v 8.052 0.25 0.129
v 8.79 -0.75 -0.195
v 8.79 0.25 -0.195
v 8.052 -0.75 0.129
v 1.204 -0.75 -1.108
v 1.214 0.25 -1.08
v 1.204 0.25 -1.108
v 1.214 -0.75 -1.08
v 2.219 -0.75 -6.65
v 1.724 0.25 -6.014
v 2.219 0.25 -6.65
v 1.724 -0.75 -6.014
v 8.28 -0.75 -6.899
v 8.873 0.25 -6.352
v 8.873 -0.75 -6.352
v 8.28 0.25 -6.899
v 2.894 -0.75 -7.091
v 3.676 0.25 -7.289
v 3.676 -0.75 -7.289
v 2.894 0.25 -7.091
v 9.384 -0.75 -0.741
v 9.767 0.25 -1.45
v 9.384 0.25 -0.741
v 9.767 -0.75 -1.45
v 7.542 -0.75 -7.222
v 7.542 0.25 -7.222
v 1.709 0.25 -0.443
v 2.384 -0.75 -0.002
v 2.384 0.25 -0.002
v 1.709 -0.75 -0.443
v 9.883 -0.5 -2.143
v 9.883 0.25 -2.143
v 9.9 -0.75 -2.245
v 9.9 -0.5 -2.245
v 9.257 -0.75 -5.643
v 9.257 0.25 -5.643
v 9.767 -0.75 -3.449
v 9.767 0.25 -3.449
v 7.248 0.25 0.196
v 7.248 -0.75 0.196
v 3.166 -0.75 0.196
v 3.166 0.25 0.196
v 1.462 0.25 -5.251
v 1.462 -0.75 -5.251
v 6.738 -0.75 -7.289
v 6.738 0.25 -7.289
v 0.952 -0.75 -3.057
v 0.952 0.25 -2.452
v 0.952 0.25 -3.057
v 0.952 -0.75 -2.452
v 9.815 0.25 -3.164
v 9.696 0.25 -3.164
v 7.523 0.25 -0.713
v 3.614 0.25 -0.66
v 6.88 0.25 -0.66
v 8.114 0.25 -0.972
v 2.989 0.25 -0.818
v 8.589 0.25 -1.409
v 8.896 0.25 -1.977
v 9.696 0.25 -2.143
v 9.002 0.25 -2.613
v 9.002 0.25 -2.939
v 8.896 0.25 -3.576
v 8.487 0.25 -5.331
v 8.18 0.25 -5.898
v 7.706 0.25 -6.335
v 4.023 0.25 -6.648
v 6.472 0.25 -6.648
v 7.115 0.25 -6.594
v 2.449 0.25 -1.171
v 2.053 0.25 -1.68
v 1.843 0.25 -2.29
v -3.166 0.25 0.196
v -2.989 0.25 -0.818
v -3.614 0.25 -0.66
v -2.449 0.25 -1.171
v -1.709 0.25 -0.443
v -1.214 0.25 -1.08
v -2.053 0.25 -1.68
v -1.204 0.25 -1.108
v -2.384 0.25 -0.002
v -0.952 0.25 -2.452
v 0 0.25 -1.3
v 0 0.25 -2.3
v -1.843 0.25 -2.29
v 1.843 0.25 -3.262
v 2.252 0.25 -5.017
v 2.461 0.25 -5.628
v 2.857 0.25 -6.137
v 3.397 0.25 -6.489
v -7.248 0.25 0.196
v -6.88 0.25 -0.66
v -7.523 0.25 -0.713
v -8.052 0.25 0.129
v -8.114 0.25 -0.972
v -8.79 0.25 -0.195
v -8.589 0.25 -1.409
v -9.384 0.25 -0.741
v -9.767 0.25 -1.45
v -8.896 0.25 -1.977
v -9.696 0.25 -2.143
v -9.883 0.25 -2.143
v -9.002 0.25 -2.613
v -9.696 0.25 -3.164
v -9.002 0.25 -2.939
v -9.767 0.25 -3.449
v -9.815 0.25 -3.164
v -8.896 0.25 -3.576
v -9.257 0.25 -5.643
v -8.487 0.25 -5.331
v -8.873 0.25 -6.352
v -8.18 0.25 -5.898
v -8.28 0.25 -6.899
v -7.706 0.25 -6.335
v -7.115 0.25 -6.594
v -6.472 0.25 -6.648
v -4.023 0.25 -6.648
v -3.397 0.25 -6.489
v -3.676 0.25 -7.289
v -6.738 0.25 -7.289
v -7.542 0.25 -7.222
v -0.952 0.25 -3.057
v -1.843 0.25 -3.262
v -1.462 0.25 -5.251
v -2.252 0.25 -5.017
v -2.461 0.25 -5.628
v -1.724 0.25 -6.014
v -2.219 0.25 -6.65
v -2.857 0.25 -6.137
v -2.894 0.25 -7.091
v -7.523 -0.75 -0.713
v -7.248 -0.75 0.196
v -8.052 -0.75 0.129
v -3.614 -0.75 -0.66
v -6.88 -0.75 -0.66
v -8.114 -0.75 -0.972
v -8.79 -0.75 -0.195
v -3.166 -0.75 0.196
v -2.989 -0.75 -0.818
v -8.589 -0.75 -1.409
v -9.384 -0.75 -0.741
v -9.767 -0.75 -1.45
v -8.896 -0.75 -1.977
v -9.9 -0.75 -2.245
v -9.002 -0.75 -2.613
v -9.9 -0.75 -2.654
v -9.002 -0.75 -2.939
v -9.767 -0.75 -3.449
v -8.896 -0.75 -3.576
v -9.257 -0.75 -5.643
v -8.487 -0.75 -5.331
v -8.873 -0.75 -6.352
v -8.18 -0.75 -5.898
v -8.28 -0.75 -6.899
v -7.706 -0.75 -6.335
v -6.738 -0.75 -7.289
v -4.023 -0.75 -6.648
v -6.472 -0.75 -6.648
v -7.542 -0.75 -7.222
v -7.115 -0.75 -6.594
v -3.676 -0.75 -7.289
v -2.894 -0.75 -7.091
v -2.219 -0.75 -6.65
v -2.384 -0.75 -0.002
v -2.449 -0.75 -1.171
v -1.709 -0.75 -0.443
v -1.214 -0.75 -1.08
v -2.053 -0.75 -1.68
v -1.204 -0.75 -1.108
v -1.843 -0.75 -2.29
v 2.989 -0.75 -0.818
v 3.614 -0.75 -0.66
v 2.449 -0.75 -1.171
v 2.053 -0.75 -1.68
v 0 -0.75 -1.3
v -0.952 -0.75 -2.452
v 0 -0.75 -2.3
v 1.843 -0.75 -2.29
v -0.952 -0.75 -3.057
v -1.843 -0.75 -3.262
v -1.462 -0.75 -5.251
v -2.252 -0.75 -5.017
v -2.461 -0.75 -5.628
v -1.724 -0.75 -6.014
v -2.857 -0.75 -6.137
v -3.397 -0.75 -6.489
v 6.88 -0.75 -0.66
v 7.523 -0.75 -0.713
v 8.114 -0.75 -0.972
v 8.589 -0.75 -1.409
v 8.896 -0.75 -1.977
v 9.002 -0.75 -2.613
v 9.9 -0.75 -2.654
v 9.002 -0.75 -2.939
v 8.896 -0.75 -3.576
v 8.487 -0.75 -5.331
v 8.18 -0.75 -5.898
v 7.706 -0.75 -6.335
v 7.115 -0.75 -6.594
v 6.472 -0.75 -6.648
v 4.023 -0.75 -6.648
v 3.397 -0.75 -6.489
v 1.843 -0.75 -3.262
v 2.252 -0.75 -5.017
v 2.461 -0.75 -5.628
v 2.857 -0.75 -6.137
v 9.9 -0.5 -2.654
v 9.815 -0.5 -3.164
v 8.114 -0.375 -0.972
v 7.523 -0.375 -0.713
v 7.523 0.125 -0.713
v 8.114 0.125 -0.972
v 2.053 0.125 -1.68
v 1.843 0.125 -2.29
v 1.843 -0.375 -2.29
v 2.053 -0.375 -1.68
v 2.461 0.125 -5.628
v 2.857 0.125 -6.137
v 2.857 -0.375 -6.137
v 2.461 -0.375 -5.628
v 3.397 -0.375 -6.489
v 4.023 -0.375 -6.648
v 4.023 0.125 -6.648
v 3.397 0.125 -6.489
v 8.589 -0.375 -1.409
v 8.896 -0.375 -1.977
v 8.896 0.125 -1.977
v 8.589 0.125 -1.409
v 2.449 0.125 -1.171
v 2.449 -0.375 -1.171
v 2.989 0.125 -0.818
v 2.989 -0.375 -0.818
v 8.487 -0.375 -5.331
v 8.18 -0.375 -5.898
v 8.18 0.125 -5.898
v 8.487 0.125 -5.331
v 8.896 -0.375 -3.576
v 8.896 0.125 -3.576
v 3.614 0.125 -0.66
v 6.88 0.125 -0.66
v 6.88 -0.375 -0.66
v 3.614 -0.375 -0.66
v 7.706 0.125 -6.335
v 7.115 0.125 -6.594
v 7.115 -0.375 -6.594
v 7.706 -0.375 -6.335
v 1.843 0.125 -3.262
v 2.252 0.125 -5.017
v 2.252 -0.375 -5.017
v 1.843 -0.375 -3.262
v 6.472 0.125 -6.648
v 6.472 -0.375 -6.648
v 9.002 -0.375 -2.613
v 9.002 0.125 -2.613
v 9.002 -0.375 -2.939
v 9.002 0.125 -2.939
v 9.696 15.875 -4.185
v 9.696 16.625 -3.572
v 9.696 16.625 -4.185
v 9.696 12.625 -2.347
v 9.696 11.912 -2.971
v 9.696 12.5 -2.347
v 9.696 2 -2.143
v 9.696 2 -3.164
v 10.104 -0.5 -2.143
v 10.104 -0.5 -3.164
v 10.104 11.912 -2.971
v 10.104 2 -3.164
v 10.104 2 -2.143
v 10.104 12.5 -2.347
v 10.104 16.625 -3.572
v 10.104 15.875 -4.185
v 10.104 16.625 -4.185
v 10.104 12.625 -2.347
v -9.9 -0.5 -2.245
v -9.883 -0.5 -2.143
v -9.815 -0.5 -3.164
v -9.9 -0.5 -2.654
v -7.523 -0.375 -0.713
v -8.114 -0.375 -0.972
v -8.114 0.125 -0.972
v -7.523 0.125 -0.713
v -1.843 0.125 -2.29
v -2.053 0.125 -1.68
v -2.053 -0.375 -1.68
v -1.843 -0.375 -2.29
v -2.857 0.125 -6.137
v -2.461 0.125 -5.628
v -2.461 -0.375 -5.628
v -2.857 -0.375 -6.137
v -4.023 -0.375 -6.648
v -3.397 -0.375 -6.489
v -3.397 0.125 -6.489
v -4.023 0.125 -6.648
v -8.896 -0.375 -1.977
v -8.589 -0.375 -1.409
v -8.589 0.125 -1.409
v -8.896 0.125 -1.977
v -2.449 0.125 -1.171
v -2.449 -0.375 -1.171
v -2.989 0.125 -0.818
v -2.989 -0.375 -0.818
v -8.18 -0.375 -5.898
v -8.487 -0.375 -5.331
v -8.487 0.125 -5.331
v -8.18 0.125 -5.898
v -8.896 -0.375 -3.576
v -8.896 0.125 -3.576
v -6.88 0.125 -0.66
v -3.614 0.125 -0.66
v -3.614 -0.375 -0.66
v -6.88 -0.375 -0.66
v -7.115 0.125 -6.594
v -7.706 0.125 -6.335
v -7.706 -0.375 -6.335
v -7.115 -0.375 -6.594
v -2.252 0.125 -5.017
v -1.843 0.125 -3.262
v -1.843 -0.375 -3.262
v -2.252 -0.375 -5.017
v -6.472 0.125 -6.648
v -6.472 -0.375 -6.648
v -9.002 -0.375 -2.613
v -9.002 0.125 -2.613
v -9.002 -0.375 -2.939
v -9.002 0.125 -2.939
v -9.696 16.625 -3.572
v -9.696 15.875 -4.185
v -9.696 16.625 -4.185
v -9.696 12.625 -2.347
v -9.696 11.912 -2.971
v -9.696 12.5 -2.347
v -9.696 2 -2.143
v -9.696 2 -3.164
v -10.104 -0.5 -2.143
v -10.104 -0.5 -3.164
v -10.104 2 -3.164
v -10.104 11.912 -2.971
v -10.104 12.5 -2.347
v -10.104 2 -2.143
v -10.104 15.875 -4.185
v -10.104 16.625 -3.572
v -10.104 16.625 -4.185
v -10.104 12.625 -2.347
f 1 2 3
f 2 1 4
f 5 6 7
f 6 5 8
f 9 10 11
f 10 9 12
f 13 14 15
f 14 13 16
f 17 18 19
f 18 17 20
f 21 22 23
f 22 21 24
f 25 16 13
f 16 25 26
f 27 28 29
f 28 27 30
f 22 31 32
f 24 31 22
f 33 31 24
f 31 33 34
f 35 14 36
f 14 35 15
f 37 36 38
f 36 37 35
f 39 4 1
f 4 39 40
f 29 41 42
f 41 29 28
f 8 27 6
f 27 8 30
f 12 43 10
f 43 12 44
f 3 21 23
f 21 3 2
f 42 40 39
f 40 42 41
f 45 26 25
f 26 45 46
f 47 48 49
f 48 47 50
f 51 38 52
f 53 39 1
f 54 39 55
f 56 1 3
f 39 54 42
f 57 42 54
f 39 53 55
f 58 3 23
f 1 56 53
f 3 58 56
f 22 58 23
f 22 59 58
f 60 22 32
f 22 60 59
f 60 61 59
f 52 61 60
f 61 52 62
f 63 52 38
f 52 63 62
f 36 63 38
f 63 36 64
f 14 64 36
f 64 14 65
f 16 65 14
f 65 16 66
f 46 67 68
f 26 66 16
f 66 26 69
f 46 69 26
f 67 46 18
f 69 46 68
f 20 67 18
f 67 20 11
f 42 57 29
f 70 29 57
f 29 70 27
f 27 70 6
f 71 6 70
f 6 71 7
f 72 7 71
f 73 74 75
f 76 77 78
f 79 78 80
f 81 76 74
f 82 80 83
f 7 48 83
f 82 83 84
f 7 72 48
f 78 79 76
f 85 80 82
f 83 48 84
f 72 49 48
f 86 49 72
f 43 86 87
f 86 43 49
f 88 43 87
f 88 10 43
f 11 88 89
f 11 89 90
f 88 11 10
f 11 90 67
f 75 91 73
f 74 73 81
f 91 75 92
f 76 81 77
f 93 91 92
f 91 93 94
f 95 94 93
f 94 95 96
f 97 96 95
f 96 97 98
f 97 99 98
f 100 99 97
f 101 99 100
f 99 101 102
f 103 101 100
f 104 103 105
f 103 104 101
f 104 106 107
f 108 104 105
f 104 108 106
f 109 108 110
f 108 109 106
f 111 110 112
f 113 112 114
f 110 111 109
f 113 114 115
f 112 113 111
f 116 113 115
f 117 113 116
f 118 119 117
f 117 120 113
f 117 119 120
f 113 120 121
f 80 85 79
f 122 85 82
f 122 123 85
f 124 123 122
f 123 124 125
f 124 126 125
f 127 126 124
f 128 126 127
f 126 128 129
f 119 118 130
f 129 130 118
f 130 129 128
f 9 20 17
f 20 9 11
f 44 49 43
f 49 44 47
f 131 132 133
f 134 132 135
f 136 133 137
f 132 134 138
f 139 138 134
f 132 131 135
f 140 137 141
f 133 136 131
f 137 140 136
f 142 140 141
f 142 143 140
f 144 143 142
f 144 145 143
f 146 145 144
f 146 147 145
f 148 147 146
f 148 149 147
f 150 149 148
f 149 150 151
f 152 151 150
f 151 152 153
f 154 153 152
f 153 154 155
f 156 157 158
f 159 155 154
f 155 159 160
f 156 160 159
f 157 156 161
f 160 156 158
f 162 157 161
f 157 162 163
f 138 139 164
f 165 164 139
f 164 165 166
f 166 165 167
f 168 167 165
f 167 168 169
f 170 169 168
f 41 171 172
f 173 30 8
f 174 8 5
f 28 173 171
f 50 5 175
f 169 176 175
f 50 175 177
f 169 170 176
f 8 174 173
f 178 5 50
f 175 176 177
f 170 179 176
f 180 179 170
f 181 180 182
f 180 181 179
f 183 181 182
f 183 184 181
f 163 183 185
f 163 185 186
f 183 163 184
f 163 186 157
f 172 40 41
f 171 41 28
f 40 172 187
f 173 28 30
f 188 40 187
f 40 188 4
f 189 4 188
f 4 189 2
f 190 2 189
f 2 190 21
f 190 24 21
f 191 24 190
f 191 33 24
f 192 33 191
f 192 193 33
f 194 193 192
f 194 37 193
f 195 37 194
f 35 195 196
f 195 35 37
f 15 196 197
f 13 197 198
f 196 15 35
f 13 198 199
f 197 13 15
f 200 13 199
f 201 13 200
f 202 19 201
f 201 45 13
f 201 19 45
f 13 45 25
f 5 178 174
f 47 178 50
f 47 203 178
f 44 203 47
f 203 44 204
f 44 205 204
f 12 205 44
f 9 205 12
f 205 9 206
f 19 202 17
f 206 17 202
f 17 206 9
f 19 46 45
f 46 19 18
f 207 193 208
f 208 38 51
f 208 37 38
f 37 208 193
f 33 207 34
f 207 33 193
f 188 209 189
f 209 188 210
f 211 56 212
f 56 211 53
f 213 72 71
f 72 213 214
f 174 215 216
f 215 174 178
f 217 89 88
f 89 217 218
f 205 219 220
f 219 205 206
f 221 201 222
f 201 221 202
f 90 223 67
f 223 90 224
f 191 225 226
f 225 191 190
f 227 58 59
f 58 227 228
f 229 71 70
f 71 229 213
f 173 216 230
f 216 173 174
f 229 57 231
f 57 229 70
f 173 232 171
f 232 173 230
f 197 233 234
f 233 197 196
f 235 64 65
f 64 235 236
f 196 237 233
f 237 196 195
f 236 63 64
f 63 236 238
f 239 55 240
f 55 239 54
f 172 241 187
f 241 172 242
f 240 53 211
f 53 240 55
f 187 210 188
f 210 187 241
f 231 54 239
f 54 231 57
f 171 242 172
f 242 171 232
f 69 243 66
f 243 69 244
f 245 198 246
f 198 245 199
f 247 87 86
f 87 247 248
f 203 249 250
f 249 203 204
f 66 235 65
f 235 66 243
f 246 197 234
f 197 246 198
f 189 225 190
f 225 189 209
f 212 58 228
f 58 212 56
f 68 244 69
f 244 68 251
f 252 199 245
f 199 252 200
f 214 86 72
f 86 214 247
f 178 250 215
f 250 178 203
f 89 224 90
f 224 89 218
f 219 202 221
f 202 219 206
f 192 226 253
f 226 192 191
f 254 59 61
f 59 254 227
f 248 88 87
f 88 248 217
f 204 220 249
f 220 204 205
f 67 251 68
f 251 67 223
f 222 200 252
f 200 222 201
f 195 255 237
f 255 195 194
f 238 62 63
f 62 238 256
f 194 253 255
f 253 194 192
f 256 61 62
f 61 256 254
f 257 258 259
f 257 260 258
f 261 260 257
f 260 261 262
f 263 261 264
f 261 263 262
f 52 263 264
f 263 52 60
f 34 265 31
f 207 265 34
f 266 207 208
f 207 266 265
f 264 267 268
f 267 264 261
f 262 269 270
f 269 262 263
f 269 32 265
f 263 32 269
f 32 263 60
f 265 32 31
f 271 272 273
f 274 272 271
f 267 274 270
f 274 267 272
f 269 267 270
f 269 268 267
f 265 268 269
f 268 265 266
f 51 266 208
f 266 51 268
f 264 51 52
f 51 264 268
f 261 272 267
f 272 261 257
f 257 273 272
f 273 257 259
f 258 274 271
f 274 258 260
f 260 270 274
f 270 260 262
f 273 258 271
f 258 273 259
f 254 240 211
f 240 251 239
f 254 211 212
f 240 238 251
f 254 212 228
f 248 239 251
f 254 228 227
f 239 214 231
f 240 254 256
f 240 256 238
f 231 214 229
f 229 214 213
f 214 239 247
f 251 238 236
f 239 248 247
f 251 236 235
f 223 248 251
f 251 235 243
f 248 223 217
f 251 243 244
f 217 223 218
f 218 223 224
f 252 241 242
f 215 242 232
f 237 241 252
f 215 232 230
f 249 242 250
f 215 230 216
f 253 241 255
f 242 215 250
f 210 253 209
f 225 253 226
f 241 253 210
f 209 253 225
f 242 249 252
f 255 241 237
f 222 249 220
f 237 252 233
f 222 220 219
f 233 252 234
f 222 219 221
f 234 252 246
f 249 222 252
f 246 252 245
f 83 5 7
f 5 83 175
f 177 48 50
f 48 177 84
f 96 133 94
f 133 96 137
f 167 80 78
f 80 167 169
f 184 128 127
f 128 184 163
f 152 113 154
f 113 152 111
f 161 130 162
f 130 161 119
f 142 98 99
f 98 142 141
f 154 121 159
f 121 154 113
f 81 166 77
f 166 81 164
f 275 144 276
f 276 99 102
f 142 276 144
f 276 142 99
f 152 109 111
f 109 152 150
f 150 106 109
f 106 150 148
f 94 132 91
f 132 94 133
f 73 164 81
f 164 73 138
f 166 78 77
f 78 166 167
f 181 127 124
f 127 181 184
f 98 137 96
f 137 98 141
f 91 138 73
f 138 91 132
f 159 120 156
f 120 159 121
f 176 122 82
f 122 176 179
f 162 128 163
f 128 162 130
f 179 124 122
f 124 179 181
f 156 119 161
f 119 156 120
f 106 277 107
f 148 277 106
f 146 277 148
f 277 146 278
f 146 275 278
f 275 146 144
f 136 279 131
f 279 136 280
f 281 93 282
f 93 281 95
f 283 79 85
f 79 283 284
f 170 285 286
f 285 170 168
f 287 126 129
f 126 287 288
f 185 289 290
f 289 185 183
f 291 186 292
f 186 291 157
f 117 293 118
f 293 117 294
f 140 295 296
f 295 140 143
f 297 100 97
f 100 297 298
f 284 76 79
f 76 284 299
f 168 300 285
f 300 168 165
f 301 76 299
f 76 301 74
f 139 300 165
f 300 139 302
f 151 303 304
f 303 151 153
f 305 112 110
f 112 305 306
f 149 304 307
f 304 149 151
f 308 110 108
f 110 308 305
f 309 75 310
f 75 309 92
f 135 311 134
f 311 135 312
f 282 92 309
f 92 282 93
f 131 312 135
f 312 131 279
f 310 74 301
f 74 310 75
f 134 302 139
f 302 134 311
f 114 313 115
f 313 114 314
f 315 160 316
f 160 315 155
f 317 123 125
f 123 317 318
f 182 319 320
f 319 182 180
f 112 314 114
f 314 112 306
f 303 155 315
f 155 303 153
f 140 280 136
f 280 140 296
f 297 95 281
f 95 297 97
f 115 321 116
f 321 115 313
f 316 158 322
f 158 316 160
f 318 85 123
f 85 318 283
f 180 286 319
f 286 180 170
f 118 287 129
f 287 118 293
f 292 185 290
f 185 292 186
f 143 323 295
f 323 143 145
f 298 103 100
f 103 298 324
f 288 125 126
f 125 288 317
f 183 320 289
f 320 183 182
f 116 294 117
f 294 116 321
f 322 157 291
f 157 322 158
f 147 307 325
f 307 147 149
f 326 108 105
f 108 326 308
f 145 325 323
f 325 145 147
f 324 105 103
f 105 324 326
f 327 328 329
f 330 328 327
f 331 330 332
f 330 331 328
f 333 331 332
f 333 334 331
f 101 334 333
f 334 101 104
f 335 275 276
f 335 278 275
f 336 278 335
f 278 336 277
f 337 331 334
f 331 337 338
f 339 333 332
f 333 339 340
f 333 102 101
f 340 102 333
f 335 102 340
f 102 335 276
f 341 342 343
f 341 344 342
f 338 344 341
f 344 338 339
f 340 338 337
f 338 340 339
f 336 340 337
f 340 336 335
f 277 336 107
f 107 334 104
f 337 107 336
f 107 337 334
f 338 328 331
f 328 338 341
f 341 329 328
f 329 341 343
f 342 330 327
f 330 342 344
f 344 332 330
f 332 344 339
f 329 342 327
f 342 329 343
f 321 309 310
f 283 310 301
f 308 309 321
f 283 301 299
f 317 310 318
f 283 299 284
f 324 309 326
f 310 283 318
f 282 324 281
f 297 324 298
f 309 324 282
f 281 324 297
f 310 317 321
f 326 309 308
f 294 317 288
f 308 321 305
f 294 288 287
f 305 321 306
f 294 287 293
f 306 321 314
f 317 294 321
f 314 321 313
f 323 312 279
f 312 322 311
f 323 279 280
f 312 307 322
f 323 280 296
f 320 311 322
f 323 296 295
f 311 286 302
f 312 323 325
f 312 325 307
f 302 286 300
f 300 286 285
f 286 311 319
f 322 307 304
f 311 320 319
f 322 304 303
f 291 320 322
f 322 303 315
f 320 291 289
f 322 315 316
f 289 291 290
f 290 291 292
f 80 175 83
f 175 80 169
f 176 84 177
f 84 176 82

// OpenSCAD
/* Parametric glasses by Ticha Sethapakdi */

//----USER DEFINED VARIABLES-----

//the style of the glasses can either be 'squared' or 'oval'
frame = "squared";
//value from 1-6; can technically be larger, but some parts may look awkward...
roundedness = 6;

//1 for regular glasses; 2 for sunglasses
style = 2;

width = 10;
height = 5;
length = 14;

//for "oval" mode only:
//(not really working at the moment, so keep this the same for now)
radius = 7;

//see the SVG color list (http://en.wikibooks.org/wiki/OpenSCAD_User_Manual/The_OpenSCAD_Language#color) 
//for all possible color selections
//e.g. Crimson, Coral, Fuchsia, Chocolate, Navy...
frame_color = "Crimson";

//if the style is "sunglasses", the user may customize the color of the lens
//again, consult the SVG color list for a range of selections
lens_color = "Aqua";


//-------------------------------

/* The glasses are created here */
eyegap = 5;

if(frame == "squared") {
	rotate([90,0,0]) {
		translate([sqrt(roundedness), -sqrt(roundedness), 0]){
		scale([1/sqrt(roundedness), 1/sqrt(roundedness), 0.5]){
		translate([width/2+eyegap/2-1.5/roundedness, 0,0]) {
			//draws one side of the frame
			color(frame_color) {
				difference() { 
					minkowski() {
						hull() {
							cube([width, 1, 1], center = true);
							translate([0,-height+1,0]){cube([3*width/4, 3*height/4, 1], center = true);}
						}
						cylinder(r=roundedness, h=1);
					}

					translate([0,-0.8,0]){ scale([0.8,0.8,2]){
					minkowski() {
						hull() {
							cube([width, 1, 1], center = true);
							translate([0,-height+1,0]){cube([3*width/4, 3*height/4, 1], center = true);}
						}
						cylinder(r=roundedness, h=1);
					}}}
				}

			}
			
			//draws the lens
			if(style == 2) {
				color(lens_color, 0.7) {
					translate([0,-0.8,0]){ scale([0.8,0.8,0.5]){
					minkowski() {
						hull() {
							cube([width, 1, 1], center = true);
							translate([0,-height+1,0]){cube([3*width/4, 3*height/4, 1], center = true);}
						}
						cylinder(r=roundedness, h=1);
					}}}
				}
			}
			
			else {
				color("white", 0.4) {
					translate([0,-0.8,0]){ scale([0.8,0.8,0.5]){
					minkowski() {
						hull() {
							cube([width, 1, 1], center = true);
							translate([0,-height+1,0]){cube([3*width/4, 3*height/4, 1], center = true);}
						}
						cylinder(r=roundedness, h=1);
					}}}
				}
			}

			//leg
			color(frame_color) {
				hull() {
					translate([width/2 + roundedness, (height/2)*0.6-2,-1.5]){ 
						cube([1, 2.5, 5], center = true);  	
					}
						
					translate([width/2 + roundedness, (height/2)*0.6-2,-23.5]){ 
						cube([1, 1.5, 3], center = true);
					}
					
				}
				hull() {
					translate([width/2 + roundedness, (height/2)*0.6-2,-24.5]){ 
						cube([1, 1.5, 1.5], center = true);
					}
					translate([width/2 + roundedness, (height/2)*0.6-5,-32.5]){ 
								cube([1, 1.5, 1.5], center = true);
					}
				}
			}

		}}}

		//bridge
		color(frame_color) {
		
			hull() {
				translate([0.25, -1.8, 0.25]){ 
						cube([0.5, 1, 1], center = true);
				}
				translate([eyegap/3, -1.8, 0.25]){ 
						cube([0.2, 1.5, 1], center = true);
				}
			}
		}
	}

	mirror([1,0,0]) {rotate([90,0,0]) {
		translate([sqrt(roundedness), -sqrt(roundedness), 0]){
		scale([1/sqrt(roundedness), 1/sqrt(roundedness), 0.5]){
		translate([width/2+eyegap/2-1.5/roundedness, 0,0]) {
			//draws one side of the frame
			color(frame_color) {
				difference() { 
					minkowski() {
						hull() {
							cube([width, 1, 1], center = true);
							translate([0,-height+1,0]){cube([3*width/4, 3*height/4, 1], center = true);}
						}
						cylinder(r=roundedness, h=1);
					}
					translate([0,-0.8,0]){ scale([0.8,0.8,2]){
					minkowski() {
						hull() {
							cube([width, 1, 1], center = true);
							translate([0,-height+1,0]){cube([3*width/4, 3*height/4, 1], center = true);}
						}
						cylinder(r=roundedness, h=1);
					}}}
				}

			}
			
			//draws the lens
			if(style == 2) {
				color(lens_color, 0.7) {
					translate([0,-0.8,0]){ scale([0.8,0.8,0.5]){
					minkowski() {
						hull() {
							cube([width, 1, 1], center = true);
							translate([0,-height+1,0]){cube([3*width/4, 3*height/4, 1], center = true);}
						}
						cylinder(r=roundedness, h=1);
					}}}
				}
			}
			
			else {
				color("white", 0.4) {
					translate([0,-0.8,0]){ scale([0.8,0.8,0.5]){
					minkowski() {
						hull() {
							cube([width, 1, 1], center = true);
							translate([0,-height+1,0]){cube([3*width/4, 3*height/4, 1], center = true);}
						}
						cylinder(r=roundedness, h=1);
					}}}
				}
			}

			//leg
			color(frame_color) {
				hull() {
					translate([width/2 + roundedness, (height/2)*0.6-2,-1.5]){ 
						cube([1, 2.5, 5], center = true);  	
					}
						
					translate([width/2 + roundedness, (height/2)*0.6-2,-23.5]){ 
						cube([1, 1.5, 3], center = true);
					}
					
				}
				hull() {
					translate([width/2 + roundedness, (height/2)*0.6-2,-24.5]){ 
						cube([1, 1.5, 1.5], center = true);
					}
					translate([width/2 + roundedness, (height/2)*0.6-5,-32.5]){ 
								cube([1, 1.5, 1.5], center = true);
					}
				}
			}

		}}}

		//bridge
		color(frame_color) {
		
			hull() {
				translate([0.25, -1.8, 0.25]){ 
						cube([0.5, 1, 1], center = true);
				}
				translate([eyegap/3, -1.8, 0.25]){ 
						cube([0.2, 1.5, 1], center = true);
				}
			}
		}
	}}

}


//ROUNDED FRAME
else if (frame == "oval") {
	rotate([90,0,0]) {
		translate([6.5*radius/8+eyegap/2, 0,0]) {
			//draws one side of the frame
			color(frame_color) {
				difference() { 
					cylinder(1,radius,radius, center = true);

					scale([0.8,0.8,2]){
						cylinder(1,radius,radius, center = true);
					}				
					
				}

			}

			//draws the lens
			if(style == 2) {
				color(lens_color, 0.7) {
					scale([0.8,0.8,0.5]){
						cylinder(1,radius,radius, center = true);
					}	
				}
			}
			
			else {
				color("white", 0.4) {
					scale([0.8,0.8,0.5]){
						cylinder(1,radius,radius, center = true);
					}	
				}

			}

			//leg
			color(frame_color) {
				hull() {
					translate([radius, 0, -2]){ 
						cube([1, 2.5, 5], center = true);  	
					}
						
					translate([radius, 0,-23.5]){ 
						cube([1, 1.5, 3], center = true);
					}
					
				}
				hull() {
					translate([radius, 0 ,-24.5]){ 
						cube([1, 1.5, 1.5], center = true);
					}
					translate([radius, -2,-32.5]){ 
								cube([1, 1.5, 1.5], center = true);
					}
				}
			}

		}

		//bridge
		color(frame_color) {
		
			hull() {
				translate([0.25, 1.5, 0]){ 
						cube([0.5, 1, 1], center = true);
				}
				translate([eyegap/3, 1.5, 0]){ 
						cube([0.2, 1.5, 1], center = true);
				}
			}
		}
	}

	mirror([1,0,0]) {rotate([90,0,0]) {
		translate([6.5*radius/8+eyegap/2, 0,0]) {
			//draws one side of the frame
			color(frame_color) {
				difference() { 
					cylinder(1,radius,radius, center = true);

					scale([0.8,0.8,2]){
						cylinder(1,radius,radius, center = true);
					}				
					
				}

			}

			//draws the lens
			if(style == 2) {
				color(lens_color, 0.7) {
					scale([0.8,0.8,0.5]){
						cylinder(1,radius,radius, center = true);
					}	
				}
			}
			
			else {
				color("white", 0.4) {
					scale([0.8,0.8,0.5]){
						cylinder(1,radius,radius, center = true);
					}	
				}

			}

			//leg
			color(frame_color) {
				hull() {
					translate([radius, 0, -2]){ 
						cube([1, 2.5, 5], center = true);  	
					}
						
					translate([radius, 0,-23.5]){ 
						cube([1, 1.5, 3], center = true);
					}
					
				}
				hull() {
					translate([radius, 0 ,-24.5]){ 
						cube([1, 1.5, 1.5], center = true);
					}
					translate([radius, -2,-32.5]){ 
								cube([1, 1.5, 1.5], center = true);
					}
				}
			}

		}

		//bridge
		color(frame_color) {
		
			hull() {
				translate([0.25, 1.5, 0]){ 
						cube([0.5, 1, 1], center = true);
				}
				translate([eyegap/3, 1.5, 0]){ 
						cube([0.2, 1.5, 1], center = true);
				}
			}
		}
	}}

			
}

else {
	echo("Undefined frame style!");
}
